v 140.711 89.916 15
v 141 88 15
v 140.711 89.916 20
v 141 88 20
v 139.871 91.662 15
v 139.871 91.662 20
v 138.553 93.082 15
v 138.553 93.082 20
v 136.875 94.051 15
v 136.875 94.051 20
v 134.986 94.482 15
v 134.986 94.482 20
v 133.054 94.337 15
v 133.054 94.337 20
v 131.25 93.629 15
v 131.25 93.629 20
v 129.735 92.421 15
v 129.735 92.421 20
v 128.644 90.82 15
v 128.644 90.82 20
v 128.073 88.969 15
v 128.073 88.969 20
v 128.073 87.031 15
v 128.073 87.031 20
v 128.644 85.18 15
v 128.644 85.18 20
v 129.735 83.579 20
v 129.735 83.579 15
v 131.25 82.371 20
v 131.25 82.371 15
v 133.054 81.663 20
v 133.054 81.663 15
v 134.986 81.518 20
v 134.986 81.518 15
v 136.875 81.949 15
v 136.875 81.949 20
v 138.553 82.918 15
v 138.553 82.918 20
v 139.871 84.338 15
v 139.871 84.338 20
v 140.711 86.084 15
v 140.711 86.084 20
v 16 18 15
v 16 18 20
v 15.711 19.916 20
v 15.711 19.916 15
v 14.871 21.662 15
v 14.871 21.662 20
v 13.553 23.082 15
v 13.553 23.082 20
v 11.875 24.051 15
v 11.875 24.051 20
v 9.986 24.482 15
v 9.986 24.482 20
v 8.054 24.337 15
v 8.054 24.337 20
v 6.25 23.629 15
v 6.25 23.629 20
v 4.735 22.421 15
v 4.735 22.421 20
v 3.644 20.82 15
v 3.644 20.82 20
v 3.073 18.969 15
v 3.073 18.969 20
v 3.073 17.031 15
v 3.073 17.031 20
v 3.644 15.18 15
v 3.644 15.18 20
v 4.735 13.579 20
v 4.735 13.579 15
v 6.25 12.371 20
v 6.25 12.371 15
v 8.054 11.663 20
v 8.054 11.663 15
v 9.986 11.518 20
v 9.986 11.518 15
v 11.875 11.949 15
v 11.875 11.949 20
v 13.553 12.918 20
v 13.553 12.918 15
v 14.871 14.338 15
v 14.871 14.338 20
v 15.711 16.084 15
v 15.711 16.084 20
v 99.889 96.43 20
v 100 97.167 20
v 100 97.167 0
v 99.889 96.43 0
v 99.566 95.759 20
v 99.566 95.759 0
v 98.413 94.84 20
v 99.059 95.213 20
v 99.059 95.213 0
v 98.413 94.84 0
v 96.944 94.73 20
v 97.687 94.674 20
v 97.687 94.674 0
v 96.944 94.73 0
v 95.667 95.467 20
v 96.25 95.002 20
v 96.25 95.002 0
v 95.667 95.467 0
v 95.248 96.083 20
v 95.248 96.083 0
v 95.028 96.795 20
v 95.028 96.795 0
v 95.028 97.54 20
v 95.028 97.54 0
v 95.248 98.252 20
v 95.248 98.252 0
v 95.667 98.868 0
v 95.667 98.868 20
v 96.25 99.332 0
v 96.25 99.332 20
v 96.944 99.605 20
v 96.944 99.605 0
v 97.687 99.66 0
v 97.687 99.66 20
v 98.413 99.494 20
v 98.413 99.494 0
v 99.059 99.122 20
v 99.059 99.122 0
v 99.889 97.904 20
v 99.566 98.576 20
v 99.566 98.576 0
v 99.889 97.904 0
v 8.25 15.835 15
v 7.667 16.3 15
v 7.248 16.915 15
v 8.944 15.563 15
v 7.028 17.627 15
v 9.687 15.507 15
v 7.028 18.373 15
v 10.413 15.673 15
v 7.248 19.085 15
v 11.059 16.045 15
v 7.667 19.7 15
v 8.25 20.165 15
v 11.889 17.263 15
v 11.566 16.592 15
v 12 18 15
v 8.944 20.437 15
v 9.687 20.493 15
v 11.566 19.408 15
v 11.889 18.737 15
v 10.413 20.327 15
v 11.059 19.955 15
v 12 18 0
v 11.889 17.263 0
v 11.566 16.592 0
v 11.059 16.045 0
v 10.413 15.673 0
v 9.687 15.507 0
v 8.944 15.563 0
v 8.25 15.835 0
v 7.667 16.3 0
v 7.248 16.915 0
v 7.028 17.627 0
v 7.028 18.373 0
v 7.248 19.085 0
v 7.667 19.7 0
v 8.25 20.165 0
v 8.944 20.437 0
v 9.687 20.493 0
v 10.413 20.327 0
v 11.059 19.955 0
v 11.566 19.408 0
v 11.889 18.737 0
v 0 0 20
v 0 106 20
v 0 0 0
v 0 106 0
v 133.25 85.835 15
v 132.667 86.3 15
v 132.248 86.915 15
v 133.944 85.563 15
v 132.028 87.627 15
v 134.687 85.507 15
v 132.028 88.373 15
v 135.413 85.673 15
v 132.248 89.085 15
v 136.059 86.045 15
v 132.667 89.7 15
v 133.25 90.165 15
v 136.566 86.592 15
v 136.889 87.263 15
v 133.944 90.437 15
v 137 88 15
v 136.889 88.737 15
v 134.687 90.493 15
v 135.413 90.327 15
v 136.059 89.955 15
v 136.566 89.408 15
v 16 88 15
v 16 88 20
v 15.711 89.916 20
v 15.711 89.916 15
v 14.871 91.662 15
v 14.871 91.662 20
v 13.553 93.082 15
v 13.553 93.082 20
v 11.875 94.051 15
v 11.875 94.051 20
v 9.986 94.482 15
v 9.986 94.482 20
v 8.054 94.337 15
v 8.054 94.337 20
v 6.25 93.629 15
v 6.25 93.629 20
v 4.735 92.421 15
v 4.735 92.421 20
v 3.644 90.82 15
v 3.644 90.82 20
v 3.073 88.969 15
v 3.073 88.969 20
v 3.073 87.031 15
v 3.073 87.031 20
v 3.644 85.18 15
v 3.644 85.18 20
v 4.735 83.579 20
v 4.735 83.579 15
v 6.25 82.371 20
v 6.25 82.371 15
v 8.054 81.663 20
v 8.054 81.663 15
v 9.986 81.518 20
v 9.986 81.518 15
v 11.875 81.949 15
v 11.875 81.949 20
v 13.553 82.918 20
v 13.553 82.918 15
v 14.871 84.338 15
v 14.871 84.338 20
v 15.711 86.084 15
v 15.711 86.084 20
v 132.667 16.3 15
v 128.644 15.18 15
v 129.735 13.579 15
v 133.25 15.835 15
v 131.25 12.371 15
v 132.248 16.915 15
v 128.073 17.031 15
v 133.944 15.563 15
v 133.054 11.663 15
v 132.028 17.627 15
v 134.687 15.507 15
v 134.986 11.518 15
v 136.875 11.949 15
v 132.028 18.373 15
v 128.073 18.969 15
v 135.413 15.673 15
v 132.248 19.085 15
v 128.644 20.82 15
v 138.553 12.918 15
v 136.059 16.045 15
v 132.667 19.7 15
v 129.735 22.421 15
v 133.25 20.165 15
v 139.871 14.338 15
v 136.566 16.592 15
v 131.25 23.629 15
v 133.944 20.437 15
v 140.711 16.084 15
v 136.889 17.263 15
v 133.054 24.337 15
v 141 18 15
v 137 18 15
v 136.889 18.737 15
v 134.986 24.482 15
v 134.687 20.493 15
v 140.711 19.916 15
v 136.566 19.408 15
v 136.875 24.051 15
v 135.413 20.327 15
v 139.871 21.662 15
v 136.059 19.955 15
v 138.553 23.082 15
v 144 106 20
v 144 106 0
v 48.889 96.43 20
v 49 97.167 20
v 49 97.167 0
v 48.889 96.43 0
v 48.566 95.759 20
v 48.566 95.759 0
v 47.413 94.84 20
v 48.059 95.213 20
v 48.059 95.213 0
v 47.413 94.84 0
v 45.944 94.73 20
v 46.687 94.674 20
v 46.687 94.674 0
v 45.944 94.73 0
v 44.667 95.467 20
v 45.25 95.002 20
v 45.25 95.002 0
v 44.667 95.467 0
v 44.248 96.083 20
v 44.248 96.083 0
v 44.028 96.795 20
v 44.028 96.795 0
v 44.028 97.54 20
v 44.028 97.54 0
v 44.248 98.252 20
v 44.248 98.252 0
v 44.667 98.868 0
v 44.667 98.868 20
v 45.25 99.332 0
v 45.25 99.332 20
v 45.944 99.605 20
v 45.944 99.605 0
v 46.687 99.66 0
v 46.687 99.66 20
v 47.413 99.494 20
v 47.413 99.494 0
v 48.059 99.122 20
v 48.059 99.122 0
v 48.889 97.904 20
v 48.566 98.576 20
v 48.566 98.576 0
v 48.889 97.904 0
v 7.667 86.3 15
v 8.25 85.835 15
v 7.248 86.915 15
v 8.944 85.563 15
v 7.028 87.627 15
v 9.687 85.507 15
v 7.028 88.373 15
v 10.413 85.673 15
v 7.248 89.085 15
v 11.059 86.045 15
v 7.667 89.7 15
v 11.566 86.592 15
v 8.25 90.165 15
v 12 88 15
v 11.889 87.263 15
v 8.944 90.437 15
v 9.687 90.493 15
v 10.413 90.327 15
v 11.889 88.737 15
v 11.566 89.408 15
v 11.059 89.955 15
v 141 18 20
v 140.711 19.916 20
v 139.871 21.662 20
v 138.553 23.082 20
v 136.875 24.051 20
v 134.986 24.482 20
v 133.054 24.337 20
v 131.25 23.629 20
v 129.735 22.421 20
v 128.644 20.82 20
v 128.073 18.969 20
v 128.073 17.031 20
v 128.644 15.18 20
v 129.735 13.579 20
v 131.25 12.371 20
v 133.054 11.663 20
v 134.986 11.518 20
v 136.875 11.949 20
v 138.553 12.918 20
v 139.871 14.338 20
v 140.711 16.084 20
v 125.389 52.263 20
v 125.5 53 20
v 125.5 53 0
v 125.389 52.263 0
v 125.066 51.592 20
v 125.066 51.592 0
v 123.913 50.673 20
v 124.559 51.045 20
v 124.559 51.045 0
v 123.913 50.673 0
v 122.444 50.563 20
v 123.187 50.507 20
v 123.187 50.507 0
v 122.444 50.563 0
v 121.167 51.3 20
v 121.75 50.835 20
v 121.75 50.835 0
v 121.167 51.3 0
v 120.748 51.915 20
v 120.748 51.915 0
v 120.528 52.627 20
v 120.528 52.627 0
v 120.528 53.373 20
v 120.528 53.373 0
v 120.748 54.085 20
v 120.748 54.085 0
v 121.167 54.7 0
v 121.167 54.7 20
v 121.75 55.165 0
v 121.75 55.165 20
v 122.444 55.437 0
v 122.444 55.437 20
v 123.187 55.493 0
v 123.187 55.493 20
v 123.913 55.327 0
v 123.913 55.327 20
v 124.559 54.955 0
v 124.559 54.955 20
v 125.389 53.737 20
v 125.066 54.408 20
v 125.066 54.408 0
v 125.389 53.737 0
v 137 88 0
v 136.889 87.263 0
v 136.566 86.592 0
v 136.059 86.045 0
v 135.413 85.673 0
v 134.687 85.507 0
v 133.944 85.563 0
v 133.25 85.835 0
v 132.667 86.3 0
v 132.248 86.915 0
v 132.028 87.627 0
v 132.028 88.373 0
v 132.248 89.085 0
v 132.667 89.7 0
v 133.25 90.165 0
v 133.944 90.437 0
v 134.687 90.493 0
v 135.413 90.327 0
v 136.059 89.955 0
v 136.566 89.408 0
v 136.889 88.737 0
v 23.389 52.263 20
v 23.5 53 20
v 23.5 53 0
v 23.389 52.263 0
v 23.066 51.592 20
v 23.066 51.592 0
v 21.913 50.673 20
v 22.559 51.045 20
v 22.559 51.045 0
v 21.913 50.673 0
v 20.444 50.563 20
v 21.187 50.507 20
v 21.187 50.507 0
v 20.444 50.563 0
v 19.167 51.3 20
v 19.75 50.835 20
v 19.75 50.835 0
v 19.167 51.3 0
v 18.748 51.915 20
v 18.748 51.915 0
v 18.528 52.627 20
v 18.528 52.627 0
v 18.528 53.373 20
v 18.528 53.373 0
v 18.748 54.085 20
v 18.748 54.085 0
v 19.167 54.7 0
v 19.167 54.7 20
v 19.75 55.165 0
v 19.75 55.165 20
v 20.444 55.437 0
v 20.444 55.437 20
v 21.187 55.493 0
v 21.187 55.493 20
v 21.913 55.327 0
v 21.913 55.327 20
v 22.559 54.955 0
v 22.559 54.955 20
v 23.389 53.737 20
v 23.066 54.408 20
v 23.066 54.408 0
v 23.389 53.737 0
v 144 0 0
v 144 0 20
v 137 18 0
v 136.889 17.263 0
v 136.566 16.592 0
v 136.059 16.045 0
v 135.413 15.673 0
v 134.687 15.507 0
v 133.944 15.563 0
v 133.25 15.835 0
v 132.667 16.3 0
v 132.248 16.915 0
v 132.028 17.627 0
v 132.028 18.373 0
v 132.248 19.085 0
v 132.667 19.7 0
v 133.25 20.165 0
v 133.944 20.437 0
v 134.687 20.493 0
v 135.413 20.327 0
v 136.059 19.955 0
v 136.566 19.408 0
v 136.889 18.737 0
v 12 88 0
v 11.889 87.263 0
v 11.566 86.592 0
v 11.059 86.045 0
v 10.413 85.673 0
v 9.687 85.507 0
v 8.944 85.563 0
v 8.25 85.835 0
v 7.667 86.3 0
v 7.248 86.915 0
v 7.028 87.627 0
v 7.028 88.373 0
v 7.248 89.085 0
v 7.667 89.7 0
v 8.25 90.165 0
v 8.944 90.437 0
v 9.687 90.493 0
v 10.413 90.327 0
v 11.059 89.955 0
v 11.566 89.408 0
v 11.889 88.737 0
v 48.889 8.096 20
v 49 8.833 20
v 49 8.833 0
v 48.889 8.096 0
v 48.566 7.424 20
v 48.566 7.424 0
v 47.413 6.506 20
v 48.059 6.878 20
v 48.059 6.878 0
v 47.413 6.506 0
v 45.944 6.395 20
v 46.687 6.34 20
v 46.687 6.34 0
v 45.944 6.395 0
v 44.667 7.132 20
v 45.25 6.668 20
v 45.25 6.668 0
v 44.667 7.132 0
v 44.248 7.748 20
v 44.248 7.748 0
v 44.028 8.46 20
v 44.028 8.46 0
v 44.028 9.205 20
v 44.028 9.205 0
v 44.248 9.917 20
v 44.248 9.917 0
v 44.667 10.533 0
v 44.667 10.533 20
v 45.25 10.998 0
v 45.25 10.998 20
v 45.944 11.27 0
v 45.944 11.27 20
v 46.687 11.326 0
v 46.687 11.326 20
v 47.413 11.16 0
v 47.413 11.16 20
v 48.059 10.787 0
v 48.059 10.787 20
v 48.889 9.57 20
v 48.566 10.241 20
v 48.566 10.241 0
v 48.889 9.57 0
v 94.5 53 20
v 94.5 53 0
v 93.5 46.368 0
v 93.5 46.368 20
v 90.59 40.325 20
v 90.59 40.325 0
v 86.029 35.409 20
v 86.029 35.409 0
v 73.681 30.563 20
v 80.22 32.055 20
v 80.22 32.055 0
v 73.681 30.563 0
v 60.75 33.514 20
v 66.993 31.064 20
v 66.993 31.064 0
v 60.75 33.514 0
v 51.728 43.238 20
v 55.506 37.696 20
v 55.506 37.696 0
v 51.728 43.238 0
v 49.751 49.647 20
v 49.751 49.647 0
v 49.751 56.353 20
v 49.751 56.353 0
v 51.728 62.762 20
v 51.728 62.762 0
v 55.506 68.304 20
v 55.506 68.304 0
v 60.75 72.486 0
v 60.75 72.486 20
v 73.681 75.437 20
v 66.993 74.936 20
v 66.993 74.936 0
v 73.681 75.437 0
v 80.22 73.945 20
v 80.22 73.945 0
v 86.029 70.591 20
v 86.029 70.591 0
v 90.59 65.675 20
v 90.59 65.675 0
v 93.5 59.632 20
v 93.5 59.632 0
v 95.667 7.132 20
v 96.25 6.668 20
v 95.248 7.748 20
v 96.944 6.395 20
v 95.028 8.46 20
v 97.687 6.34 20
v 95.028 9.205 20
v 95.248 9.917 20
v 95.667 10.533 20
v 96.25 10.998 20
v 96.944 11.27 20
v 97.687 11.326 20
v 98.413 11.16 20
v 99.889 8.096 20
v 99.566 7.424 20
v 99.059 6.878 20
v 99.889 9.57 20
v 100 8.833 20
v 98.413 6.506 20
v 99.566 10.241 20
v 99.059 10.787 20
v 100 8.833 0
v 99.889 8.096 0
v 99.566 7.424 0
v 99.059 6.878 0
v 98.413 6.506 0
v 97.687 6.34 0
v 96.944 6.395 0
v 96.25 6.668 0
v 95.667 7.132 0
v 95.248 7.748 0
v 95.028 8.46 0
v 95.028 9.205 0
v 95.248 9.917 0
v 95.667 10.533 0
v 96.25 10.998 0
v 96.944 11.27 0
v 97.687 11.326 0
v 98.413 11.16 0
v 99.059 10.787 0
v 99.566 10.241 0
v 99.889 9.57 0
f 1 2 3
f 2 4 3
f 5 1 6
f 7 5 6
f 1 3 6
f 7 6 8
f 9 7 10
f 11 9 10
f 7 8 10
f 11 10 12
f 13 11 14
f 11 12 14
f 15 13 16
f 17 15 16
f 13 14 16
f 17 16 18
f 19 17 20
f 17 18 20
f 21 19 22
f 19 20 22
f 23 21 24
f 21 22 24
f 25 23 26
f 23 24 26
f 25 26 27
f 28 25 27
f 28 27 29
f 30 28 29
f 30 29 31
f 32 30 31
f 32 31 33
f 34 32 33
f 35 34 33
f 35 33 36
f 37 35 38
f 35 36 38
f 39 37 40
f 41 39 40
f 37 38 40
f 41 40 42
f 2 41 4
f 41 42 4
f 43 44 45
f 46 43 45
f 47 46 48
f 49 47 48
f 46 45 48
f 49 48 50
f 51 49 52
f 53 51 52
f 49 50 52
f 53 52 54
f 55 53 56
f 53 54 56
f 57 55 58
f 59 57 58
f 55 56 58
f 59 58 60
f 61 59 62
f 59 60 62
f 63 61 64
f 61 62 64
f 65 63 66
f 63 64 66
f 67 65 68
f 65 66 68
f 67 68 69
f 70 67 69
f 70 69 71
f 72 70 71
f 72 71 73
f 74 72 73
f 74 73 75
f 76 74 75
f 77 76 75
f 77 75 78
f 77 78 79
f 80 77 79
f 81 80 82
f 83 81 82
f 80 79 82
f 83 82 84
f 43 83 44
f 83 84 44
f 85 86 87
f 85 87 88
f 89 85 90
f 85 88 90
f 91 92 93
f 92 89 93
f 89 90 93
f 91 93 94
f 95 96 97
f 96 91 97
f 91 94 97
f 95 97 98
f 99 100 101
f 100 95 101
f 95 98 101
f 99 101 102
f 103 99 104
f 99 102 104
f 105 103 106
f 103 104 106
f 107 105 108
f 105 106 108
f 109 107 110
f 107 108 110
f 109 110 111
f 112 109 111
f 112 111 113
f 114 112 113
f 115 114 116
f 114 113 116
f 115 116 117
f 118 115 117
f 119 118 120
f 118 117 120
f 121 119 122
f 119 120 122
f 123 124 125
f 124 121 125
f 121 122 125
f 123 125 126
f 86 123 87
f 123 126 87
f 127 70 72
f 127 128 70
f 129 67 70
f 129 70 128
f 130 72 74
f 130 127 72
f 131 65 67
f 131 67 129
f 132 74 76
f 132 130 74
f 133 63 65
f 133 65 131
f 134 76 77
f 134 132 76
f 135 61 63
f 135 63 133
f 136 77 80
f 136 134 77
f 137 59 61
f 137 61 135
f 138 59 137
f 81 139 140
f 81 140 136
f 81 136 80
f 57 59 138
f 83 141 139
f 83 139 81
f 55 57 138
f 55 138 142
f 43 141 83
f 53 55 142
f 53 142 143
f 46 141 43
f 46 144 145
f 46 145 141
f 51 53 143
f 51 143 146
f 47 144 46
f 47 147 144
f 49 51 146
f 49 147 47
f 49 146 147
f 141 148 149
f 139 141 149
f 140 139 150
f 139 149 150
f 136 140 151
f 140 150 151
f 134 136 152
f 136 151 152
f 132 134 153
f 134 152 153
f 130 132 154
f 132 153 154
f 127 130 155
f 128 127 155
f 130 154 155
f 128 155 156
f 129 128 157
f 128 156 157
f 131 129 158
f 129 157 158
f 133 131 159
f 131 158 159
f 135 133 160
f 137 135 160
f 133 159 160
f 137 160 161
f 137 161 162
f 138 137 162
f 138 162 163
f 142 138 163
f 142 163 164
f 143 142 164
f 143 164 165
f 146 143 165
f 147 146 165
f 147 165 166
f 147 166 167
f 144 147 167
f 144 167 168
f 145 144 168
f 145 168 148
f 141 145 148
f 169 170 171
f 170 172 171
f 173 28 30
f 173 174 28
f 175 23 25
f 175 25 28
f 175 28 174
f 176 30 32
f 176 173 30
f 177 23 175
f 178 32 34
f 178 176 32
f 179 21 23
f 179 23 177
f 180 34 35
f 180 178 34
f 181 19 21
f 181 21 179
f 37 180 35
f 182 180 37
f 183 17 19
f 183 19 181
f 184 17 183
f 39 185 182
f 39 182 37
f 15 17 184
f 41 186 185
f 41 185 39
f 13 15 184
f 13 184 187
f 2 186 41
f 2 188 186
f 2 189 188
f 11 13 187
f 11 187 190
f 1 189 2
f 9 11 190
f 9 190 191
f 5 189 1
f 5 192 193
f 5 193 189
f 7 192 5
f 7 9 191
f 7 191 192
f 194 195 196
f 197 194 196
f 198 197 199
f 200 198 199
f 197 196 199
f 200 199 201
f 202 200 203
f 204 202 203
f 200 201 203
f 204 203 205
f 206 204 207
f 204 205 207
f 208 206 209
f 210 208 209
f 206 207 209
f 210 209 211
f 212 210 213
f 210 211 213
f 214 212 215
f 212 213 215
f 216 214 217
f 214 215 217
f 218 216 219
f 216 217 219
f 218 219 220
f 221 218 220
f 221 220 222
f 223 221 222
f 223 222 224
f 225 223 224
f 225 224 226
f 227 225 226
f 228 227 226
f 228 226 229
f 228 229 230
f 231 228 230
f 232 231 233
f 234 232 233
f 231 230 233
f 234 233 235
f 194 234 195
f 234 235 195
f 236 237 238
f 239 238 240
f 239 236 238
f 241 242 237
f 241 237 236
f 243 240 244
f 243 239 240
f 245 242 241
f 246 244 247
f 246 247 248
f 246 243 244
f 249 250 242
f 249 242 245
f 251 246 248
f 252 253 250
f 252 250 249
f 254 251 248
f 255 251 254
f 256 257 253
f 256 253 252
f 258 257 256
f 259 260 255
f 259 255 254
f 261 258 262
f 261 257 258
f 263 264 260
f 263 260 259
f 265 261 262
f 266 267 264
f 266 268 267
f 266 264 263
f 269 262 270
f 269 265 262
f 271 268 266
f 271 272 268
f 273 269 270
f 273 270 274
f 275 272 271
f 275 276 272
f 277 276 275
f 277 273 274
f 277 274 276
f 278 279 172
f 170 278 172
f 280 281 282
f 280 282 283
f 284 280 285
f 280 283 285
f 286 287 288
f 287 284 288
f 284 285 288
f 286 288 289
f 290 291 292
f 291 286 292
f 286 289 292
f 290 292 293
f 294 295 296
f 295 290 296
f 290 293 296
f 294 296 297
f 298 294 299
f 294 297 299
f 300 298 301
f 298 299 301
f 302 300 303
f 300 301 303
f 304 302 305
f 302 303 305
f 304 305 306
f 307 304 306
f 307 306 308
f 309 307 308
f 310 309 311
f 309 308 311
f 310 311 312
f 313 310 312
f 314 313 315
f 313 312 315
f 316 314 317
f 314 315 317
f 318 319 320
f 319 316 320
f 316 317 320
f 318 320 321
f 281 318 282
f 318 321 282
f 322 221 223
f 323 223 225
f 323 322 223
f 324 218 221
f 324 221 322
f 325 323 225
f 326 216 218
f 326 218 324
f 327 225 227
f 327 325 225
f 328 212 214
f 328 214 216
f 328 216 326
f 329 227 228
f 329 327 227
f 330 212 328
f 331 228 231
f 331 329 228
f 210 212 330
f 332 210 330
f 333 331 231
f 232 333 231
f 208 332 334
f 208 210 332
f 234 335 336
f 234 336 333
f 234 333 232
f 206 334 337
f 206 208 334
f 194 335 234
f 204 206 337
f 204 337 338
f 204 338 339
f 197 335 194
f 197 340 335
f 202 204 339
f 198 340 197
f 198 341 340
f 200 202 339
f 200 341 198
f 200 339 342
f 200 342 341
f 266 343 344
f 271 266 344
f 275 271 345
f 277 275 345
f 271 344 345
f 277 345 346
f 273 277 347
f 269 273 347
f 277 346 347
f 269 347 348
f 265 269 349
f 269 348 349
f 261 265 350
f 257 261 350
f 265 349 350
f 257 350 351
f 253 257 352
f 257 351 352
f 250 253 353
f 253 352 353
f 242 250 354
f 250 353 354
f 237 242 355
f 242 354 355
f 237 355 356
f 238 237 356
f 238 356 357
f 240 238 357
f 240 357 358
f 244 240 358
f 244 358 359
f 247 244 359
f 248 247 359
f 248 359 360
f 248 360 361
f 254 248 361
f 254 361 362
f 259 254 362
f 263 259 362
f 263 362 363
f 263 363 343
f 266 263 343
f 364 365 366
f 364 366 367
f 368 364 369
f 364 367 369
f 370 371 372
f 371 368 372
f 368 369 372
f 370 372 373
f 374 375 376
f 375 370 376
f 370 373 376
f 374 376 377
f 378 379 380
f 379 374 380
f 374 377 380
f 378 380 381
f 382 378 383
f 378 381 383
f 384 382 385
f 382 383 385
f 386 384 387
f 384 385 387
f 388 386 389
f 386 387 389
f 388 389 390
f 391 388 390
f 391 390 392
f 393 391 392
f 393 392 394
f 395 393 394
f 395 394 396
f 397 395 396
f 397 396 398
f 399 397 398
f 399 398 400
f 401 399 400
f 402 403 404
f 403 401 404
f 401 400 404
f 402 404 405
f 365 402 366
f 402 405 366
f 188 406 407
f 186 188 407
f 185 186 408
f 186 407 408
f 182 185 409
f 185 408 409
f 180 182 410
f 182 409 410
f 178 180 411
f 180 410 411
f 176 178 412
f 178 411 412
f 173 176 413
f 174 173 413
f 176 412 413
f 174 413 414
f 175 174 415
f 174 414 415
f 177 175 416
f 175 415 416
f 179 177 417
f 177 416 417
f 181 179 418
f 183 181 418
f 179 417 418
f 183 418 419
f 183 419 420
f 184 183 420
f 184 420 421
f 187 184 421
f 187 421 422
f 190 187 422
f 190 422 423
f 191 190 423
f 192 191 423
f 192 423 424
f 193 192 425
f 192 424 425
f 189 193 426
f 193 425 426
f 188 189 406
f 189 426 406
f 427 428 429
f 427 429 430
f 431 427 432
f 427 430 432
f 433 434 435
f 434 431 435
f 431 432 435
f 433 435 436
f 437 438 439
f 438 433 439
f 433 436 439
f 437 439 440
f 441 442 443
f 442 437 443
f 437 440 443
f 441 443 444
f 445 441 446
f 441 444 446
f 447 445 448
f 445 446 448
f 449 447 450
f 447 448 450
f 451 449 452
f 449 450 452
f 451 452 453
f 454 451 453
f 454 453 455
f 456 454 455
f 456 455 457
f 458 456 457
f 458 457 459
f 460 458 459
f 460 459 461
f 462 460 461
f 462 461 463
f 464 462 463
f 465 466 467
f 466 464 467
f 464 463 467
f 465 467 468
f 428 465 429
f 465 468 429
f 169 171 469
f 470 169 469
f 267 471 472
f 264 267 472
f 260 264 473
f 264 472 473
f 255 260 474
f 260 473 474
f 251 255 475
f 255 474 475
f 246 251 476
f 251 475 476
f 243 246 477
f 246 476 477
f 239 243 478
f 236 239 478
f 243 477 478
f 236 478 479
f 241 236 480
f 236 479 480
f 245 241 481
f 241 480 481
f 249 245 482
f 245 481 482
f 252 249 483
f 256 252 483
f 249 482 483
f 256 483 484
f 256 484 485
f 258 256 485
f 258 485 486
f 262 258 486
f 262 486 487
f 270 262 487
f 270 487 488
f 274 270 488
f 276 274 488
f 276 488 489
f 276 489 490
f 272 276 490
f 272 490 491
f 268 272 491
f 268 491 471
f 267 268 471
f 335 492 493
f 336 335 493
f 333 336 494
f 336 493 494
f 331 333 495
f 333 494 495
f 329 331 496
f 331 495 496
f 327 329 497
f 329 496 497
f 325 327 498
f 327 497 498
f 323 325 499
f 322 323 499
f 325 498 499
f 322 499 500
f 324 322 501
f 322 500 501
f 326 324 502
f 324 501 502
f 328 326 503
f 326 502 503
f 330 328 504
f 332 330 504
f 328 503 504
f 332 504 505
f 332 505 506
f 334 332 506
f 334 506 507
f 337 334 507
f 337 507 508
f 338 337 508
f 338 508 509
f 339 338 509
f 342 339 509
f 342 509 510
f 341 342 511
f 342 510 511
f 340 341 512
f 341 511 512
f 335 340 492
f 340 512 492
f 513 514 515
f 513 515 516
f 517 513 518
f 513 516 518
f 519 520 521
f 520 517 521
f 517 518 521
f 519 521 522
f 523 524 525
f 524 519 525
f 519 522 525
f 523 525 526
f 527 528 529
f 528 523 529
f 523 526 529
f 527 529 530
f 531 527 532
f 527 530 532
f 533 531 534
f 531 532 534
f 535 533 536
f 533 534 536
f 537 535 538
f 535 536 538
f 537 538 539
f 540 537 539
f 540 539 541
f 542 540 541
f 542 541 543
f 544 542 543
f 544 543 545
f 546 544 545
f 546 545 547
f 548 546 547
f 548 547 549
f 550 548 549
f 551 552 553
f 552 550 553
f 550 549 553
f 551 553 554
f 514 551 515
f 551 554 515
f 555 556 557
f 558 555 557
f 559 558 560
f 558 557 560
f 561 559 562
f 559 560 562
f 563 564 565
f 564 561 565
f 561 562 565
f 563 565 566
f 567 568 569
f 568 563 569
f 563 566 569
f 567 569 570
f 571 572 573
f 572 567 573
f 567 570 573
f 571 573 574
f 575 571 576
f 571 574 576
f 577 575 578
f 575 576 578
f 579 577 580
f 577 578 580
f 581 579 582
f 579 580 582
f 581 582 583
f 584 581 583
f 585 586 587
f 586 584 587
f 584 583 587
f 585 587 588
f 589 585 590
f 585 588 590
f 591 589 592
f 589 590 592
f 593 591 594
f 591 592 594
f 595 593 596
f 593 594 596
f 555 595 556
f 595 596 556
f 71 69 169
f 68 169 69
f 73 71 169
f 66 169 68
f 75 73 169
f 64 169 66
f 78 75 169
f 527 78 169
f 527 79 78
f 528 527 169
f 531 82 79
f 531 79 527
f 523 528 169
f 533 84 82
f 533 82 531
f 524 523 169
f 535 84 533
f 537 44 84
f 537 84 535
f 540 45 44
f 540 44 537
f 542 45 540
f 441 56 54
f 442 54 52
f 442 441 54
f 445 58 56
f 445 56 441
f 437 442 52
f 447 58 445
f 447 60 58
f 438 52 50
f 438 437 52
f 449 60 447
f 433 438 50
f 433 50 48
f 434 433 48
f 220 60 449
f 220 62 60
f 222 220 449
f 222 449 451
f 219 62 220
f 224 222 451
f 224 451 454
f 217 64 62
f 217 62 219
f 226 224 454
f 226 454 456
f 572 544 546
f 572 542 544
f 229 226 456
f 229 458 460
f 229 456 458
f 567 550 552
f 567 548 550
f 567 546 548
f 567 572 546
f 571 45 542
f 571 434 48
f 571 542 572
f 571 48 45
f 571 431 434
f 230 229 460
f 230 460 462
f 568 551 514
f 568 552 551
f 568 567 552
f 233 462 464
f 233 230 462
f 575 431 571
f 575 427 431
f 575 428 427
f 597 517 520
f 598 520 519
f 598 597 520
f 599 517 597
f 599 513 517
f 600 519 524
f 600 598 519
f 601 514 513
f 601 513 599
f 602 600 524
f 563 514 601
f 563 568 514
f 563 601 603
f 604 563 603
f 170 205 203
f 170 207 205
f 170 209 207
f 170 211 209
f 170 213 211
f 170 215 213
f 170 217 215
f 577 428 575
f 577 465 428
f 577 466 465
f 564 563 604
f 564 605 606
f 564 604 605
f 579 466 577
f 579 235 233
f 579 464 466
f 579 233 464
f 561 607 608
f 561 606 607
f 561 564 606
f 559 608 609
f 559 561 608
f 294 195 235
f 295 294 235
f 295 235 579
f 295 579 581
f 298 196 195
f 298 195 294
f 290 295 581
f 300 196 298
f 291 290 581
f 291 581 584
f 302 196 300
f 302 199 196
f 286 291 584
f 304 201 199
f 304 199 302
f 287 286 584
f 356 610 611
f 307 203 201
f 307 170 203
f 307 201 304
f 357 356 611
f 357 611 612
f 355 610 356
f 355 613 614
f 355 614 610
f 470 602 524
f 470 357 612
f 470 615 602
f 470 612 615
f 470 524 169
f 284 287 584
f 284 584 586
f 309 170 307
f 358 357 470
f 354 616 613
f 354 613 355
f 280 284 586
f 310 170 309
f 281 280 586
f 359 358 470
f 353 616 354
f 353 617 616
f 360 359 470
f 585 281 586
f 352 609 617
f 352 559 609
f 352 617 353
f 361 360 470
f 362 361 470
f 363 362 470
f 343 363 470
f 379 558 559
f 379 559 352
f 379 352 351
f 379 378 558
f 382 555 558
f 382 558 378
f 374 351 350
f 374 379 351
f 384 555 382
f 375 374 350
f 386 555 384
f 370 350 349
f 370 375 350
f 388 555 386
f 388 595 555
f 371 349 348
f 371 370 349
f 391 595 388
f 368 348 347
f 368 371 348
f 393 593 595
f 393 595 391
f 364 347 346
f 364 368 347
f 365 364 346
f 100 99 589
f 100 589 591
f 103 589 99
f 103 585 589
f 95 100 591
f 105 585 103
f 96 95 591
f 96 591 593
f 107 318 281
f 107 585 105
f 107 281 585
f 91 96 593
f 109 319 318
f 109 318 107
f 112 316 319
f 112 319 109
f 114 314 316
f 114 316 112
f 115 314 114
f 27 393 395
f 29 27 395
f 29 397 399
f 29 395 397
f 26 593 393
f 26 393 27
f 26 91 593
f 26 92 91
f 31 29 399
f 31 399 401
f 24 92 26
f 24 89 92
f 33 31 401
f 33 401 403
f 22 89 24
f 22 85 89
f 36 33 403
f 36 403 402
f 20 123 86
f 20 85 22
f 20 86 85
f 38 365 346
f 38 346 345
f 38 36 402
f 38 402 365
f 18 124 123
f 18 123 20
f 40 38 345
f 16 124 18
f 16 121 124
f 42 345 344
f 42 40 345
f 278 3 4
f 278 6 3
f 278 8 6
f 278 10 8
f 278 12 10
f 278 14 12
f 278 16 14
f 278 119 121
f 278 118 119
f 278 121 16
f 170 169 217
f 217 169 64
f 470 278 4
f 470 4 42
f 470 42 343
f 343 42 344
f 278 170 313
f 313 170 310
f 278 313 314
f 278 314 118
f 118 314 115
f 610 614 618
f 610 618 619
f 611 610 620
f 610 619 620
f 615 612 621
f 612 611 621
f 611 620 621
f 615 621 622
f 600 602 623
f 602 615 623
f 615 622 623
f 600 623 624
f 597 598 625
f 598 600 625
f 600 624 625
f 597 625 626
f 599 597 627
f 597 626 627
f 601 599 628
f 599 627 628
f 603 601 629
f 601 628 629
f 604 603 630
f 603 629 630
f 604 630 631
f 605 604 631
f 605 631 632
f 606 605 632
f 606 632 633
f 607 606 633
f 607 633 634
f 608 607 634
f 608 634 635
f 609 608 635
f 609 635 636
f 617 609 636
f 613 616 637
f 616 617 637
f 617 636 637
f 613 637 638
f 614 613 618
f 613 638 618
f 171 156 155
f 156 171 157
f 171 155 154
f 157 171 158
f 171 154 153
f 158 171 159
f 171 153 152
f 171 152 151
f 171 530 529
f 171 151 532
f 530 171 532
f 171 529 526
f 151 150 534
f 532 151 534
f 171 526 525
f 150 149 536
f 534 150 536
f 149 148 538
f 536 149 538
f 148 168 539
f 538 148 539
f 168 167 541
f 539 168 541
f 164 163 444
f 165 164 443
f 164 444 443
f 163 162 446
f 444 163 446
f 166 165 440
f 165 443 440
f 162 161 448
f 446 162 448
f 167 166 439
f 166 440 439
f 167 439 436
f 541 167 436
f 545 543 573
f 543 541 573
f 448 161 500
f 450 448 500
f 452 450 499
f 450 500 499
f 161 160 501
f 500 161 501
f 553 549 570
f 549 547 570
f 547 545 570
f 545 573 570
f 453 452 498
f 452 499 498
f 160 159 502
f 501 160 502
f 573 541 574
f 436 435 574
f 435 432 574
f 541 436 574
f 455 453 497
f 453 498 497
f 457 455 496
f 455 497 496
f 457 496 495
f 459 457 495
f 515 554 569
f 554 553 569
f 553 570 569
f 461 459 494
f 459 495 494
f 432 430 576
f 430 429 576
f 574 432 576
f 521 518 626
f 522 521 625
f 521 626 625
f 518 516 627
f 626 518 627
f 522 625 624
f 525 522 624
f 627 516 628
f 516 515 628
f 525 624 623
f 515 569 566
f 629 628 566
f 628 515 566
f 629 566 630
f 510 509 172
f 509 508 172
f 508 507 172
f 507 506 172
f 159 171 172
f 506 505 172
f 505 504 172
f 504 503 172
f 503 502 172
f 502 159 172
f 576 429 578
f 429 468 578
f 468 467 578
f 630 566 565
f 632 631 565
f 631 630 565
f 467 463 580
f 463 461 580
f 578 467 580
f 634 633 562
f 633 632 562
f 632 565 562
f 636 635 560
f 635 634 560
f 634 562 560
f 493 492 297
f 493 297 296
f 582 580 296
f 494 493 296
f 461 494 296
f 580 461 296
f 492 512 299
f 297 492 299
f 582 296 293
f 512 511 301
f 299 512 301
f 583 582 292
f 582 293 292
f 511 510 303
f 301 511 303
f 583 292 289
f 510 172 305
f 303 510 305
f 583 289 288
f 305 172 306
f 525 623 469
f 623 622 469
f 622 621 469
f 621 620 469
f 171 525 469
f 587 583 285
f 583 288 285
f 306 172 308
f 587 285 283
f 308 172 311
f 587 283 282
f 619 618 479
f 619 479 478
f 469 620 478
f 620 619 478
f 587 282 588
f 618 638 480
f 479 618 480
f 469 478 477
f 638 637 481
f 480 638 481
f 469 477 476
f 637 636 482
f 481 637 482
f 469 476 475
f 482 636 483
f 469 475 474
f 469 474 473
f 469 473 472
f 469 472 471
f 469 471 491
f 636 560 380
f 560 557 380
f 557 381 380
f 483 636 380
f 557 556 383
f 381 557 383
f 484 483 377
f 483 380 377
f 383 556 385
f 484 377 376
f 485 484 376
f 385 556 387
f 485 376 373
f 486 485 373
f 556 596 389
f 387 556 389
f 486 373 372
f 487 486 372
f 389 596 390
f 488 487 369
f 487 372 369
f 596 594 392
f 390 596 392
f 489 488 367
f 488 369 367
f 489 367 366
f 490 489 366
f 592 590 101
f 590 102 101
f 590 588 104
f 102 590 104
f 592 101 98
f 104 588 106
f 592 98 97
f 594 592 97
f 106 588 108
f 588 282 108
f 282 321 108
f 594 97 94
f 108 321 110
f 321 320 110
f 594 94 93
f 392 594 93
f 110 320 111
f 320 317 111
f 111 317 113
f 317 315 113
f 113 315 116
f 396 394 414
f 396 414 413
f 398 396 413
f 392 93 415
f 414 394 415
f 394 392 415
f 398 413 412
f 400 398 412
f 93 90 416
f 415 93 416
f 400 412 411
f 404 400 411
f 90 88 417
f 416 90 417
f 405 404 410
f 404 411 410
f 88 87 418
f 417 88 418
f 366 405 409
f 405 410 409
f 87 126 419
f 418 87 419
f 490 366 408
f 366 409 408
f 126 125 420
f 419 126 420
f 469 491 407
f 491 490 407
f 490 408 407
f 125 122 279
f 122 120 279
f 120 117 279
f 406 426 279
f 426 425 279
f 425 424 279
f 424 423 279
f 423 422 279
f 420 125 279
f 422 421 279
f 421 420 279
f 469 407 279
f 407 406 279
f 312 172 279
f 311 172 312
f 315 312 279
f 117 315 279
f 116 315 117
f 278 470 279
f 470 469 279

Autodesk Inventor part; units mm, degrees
ref_plane "YZ Plane" through (0, 0, 0) normal (1, 0, 0) x (0, 1, 0)
ref_plane "XZ Plane" through (0, 0, 0) normal (0, 1, 0) x (-1, 0, 0)
ref_plane "XY Plane" through (0, 0, 0) normal (0, 0, 1) x (1, 0, 0)
sketch "Sketch1" plane through (0, 0, 0) normal (0, 0, 1) x (1, 0, 0)
  line L0 (0, 0) -> (144, 0)
  line L1 (144, 0) -> (144, 106)
  line L2 (144, 106) -> (0, 106)
  line L3 (0, 106) -> (0, 0)
  line L4 (21, 53) -> (46.5, 97.1673) construction
  line L5 (46.5, 97.1673) -> (97.5, 97.1673) construction
  line L6 (97.5, 97.1673) -> (123, 53) construction
  line L7 (123, 53) -> (97.5, 8.8327) construction
  line L8 (97.5, 8.8327) -> (46.5, 8.8327) construction
  line L9 (46.5, 8.8327) -> (21, 53) construction
  circle A0 centre (21, 53) radius 2.5
  circle A1 centre (46.5, 8.8327) radius 2.5
  circle A2 centre (97.5, 8.8327) radius 2.5
  circle A3 centre (123, 53) radius 2.5
  circle A4 centre (97.5, 97.1673) radius 2.5
  circle A5 centre (46.5, 97.1673) radius 2.5
  line L10 (9.5, 88) -> (9.5, 18) construction
  circle A6 centre (9.5, 88) radius 2.5
  circle A7 centre (9.5, 18) radius 2.5
  line L11 (134.5, 88) -> (134.5, 18) construction
  circle A8 centre (134.5, 88) radius 2.5
  circle A9 centre (134.5, 18) radius 2.5
  circle A10 centre (72, 53) radius 22.5
  point P0 (72, 106)
  point P1 (144, 53)
  point P2 (9.5, 53)
  point P3 (134.5, 53)
  dimension "d0" = 144
  dimension "d1" = 106
  dimension "d2" = 5
  dimension "d3" = 51
  dimension "d6" = 360
  dimension "d8" = 70
  dimension "d9" = 9.5
  dimension "d10" = 5
  dimension "d11" = 5
  dimension "d12" = 9.5
  dimension "d13" = 5
  dimension "d14" = 5
  dimension "d15" = 45
extrude "Extrusion1" add sketch "Sketch1" along normal blind 20
sketch "Sketch2" plane through (0, 0, 20) normal (0, 0, 1) x (1, 0, 0)
  circle A0 centre (46.5, 97.1673) radius 2.5 construction
  circle A1 centre (46.5, 97.1673) radius 6.5
  circle A2 centre (72, 53) radius 22.5 construction
  circle A3 centre (9.5, 88) radius 2.5 construction
  circle A4 centre (9.5, 18) radius 2.5 construction
  circle A5 centre (134.5, 88) radius 2.5 construction
  circle A6 centre (134.5, 18) radius 2.5 construction
  circle A7 centre (9.5, 88) radius 6.5
  circle A8 centre (9.5, 18) radius 6.5
  circle A9 centre (134.5, 18) radius 6.5
  circle A10 centre (134.5, 88) radius 6.5
  circle A11 centre (21, 53) radius 6.5
  circle A12 centre (46.5, 8.8327) radius 6.5
  circle A13 centre (97.5, 8.8327) radius 6.5
  circle A14 centre (123, 53) radius 6.5
  circle A15 centre (97.5, 97.1673) radius 6.5
  point P0 (0, 0)
  dimension "d18" = 13
  dimension "d19" = 13
  dimension "d20" = 13
  dimension "d21" = 13
  dimension "d22" = 13
  dimension "d25" = 360
extrude "Extrusion2" cut sketch "Sketch2" against normal blind 5 contours A7 | A8 | A9 | A10
properties part number "GA08" material "ABS Plastic"
